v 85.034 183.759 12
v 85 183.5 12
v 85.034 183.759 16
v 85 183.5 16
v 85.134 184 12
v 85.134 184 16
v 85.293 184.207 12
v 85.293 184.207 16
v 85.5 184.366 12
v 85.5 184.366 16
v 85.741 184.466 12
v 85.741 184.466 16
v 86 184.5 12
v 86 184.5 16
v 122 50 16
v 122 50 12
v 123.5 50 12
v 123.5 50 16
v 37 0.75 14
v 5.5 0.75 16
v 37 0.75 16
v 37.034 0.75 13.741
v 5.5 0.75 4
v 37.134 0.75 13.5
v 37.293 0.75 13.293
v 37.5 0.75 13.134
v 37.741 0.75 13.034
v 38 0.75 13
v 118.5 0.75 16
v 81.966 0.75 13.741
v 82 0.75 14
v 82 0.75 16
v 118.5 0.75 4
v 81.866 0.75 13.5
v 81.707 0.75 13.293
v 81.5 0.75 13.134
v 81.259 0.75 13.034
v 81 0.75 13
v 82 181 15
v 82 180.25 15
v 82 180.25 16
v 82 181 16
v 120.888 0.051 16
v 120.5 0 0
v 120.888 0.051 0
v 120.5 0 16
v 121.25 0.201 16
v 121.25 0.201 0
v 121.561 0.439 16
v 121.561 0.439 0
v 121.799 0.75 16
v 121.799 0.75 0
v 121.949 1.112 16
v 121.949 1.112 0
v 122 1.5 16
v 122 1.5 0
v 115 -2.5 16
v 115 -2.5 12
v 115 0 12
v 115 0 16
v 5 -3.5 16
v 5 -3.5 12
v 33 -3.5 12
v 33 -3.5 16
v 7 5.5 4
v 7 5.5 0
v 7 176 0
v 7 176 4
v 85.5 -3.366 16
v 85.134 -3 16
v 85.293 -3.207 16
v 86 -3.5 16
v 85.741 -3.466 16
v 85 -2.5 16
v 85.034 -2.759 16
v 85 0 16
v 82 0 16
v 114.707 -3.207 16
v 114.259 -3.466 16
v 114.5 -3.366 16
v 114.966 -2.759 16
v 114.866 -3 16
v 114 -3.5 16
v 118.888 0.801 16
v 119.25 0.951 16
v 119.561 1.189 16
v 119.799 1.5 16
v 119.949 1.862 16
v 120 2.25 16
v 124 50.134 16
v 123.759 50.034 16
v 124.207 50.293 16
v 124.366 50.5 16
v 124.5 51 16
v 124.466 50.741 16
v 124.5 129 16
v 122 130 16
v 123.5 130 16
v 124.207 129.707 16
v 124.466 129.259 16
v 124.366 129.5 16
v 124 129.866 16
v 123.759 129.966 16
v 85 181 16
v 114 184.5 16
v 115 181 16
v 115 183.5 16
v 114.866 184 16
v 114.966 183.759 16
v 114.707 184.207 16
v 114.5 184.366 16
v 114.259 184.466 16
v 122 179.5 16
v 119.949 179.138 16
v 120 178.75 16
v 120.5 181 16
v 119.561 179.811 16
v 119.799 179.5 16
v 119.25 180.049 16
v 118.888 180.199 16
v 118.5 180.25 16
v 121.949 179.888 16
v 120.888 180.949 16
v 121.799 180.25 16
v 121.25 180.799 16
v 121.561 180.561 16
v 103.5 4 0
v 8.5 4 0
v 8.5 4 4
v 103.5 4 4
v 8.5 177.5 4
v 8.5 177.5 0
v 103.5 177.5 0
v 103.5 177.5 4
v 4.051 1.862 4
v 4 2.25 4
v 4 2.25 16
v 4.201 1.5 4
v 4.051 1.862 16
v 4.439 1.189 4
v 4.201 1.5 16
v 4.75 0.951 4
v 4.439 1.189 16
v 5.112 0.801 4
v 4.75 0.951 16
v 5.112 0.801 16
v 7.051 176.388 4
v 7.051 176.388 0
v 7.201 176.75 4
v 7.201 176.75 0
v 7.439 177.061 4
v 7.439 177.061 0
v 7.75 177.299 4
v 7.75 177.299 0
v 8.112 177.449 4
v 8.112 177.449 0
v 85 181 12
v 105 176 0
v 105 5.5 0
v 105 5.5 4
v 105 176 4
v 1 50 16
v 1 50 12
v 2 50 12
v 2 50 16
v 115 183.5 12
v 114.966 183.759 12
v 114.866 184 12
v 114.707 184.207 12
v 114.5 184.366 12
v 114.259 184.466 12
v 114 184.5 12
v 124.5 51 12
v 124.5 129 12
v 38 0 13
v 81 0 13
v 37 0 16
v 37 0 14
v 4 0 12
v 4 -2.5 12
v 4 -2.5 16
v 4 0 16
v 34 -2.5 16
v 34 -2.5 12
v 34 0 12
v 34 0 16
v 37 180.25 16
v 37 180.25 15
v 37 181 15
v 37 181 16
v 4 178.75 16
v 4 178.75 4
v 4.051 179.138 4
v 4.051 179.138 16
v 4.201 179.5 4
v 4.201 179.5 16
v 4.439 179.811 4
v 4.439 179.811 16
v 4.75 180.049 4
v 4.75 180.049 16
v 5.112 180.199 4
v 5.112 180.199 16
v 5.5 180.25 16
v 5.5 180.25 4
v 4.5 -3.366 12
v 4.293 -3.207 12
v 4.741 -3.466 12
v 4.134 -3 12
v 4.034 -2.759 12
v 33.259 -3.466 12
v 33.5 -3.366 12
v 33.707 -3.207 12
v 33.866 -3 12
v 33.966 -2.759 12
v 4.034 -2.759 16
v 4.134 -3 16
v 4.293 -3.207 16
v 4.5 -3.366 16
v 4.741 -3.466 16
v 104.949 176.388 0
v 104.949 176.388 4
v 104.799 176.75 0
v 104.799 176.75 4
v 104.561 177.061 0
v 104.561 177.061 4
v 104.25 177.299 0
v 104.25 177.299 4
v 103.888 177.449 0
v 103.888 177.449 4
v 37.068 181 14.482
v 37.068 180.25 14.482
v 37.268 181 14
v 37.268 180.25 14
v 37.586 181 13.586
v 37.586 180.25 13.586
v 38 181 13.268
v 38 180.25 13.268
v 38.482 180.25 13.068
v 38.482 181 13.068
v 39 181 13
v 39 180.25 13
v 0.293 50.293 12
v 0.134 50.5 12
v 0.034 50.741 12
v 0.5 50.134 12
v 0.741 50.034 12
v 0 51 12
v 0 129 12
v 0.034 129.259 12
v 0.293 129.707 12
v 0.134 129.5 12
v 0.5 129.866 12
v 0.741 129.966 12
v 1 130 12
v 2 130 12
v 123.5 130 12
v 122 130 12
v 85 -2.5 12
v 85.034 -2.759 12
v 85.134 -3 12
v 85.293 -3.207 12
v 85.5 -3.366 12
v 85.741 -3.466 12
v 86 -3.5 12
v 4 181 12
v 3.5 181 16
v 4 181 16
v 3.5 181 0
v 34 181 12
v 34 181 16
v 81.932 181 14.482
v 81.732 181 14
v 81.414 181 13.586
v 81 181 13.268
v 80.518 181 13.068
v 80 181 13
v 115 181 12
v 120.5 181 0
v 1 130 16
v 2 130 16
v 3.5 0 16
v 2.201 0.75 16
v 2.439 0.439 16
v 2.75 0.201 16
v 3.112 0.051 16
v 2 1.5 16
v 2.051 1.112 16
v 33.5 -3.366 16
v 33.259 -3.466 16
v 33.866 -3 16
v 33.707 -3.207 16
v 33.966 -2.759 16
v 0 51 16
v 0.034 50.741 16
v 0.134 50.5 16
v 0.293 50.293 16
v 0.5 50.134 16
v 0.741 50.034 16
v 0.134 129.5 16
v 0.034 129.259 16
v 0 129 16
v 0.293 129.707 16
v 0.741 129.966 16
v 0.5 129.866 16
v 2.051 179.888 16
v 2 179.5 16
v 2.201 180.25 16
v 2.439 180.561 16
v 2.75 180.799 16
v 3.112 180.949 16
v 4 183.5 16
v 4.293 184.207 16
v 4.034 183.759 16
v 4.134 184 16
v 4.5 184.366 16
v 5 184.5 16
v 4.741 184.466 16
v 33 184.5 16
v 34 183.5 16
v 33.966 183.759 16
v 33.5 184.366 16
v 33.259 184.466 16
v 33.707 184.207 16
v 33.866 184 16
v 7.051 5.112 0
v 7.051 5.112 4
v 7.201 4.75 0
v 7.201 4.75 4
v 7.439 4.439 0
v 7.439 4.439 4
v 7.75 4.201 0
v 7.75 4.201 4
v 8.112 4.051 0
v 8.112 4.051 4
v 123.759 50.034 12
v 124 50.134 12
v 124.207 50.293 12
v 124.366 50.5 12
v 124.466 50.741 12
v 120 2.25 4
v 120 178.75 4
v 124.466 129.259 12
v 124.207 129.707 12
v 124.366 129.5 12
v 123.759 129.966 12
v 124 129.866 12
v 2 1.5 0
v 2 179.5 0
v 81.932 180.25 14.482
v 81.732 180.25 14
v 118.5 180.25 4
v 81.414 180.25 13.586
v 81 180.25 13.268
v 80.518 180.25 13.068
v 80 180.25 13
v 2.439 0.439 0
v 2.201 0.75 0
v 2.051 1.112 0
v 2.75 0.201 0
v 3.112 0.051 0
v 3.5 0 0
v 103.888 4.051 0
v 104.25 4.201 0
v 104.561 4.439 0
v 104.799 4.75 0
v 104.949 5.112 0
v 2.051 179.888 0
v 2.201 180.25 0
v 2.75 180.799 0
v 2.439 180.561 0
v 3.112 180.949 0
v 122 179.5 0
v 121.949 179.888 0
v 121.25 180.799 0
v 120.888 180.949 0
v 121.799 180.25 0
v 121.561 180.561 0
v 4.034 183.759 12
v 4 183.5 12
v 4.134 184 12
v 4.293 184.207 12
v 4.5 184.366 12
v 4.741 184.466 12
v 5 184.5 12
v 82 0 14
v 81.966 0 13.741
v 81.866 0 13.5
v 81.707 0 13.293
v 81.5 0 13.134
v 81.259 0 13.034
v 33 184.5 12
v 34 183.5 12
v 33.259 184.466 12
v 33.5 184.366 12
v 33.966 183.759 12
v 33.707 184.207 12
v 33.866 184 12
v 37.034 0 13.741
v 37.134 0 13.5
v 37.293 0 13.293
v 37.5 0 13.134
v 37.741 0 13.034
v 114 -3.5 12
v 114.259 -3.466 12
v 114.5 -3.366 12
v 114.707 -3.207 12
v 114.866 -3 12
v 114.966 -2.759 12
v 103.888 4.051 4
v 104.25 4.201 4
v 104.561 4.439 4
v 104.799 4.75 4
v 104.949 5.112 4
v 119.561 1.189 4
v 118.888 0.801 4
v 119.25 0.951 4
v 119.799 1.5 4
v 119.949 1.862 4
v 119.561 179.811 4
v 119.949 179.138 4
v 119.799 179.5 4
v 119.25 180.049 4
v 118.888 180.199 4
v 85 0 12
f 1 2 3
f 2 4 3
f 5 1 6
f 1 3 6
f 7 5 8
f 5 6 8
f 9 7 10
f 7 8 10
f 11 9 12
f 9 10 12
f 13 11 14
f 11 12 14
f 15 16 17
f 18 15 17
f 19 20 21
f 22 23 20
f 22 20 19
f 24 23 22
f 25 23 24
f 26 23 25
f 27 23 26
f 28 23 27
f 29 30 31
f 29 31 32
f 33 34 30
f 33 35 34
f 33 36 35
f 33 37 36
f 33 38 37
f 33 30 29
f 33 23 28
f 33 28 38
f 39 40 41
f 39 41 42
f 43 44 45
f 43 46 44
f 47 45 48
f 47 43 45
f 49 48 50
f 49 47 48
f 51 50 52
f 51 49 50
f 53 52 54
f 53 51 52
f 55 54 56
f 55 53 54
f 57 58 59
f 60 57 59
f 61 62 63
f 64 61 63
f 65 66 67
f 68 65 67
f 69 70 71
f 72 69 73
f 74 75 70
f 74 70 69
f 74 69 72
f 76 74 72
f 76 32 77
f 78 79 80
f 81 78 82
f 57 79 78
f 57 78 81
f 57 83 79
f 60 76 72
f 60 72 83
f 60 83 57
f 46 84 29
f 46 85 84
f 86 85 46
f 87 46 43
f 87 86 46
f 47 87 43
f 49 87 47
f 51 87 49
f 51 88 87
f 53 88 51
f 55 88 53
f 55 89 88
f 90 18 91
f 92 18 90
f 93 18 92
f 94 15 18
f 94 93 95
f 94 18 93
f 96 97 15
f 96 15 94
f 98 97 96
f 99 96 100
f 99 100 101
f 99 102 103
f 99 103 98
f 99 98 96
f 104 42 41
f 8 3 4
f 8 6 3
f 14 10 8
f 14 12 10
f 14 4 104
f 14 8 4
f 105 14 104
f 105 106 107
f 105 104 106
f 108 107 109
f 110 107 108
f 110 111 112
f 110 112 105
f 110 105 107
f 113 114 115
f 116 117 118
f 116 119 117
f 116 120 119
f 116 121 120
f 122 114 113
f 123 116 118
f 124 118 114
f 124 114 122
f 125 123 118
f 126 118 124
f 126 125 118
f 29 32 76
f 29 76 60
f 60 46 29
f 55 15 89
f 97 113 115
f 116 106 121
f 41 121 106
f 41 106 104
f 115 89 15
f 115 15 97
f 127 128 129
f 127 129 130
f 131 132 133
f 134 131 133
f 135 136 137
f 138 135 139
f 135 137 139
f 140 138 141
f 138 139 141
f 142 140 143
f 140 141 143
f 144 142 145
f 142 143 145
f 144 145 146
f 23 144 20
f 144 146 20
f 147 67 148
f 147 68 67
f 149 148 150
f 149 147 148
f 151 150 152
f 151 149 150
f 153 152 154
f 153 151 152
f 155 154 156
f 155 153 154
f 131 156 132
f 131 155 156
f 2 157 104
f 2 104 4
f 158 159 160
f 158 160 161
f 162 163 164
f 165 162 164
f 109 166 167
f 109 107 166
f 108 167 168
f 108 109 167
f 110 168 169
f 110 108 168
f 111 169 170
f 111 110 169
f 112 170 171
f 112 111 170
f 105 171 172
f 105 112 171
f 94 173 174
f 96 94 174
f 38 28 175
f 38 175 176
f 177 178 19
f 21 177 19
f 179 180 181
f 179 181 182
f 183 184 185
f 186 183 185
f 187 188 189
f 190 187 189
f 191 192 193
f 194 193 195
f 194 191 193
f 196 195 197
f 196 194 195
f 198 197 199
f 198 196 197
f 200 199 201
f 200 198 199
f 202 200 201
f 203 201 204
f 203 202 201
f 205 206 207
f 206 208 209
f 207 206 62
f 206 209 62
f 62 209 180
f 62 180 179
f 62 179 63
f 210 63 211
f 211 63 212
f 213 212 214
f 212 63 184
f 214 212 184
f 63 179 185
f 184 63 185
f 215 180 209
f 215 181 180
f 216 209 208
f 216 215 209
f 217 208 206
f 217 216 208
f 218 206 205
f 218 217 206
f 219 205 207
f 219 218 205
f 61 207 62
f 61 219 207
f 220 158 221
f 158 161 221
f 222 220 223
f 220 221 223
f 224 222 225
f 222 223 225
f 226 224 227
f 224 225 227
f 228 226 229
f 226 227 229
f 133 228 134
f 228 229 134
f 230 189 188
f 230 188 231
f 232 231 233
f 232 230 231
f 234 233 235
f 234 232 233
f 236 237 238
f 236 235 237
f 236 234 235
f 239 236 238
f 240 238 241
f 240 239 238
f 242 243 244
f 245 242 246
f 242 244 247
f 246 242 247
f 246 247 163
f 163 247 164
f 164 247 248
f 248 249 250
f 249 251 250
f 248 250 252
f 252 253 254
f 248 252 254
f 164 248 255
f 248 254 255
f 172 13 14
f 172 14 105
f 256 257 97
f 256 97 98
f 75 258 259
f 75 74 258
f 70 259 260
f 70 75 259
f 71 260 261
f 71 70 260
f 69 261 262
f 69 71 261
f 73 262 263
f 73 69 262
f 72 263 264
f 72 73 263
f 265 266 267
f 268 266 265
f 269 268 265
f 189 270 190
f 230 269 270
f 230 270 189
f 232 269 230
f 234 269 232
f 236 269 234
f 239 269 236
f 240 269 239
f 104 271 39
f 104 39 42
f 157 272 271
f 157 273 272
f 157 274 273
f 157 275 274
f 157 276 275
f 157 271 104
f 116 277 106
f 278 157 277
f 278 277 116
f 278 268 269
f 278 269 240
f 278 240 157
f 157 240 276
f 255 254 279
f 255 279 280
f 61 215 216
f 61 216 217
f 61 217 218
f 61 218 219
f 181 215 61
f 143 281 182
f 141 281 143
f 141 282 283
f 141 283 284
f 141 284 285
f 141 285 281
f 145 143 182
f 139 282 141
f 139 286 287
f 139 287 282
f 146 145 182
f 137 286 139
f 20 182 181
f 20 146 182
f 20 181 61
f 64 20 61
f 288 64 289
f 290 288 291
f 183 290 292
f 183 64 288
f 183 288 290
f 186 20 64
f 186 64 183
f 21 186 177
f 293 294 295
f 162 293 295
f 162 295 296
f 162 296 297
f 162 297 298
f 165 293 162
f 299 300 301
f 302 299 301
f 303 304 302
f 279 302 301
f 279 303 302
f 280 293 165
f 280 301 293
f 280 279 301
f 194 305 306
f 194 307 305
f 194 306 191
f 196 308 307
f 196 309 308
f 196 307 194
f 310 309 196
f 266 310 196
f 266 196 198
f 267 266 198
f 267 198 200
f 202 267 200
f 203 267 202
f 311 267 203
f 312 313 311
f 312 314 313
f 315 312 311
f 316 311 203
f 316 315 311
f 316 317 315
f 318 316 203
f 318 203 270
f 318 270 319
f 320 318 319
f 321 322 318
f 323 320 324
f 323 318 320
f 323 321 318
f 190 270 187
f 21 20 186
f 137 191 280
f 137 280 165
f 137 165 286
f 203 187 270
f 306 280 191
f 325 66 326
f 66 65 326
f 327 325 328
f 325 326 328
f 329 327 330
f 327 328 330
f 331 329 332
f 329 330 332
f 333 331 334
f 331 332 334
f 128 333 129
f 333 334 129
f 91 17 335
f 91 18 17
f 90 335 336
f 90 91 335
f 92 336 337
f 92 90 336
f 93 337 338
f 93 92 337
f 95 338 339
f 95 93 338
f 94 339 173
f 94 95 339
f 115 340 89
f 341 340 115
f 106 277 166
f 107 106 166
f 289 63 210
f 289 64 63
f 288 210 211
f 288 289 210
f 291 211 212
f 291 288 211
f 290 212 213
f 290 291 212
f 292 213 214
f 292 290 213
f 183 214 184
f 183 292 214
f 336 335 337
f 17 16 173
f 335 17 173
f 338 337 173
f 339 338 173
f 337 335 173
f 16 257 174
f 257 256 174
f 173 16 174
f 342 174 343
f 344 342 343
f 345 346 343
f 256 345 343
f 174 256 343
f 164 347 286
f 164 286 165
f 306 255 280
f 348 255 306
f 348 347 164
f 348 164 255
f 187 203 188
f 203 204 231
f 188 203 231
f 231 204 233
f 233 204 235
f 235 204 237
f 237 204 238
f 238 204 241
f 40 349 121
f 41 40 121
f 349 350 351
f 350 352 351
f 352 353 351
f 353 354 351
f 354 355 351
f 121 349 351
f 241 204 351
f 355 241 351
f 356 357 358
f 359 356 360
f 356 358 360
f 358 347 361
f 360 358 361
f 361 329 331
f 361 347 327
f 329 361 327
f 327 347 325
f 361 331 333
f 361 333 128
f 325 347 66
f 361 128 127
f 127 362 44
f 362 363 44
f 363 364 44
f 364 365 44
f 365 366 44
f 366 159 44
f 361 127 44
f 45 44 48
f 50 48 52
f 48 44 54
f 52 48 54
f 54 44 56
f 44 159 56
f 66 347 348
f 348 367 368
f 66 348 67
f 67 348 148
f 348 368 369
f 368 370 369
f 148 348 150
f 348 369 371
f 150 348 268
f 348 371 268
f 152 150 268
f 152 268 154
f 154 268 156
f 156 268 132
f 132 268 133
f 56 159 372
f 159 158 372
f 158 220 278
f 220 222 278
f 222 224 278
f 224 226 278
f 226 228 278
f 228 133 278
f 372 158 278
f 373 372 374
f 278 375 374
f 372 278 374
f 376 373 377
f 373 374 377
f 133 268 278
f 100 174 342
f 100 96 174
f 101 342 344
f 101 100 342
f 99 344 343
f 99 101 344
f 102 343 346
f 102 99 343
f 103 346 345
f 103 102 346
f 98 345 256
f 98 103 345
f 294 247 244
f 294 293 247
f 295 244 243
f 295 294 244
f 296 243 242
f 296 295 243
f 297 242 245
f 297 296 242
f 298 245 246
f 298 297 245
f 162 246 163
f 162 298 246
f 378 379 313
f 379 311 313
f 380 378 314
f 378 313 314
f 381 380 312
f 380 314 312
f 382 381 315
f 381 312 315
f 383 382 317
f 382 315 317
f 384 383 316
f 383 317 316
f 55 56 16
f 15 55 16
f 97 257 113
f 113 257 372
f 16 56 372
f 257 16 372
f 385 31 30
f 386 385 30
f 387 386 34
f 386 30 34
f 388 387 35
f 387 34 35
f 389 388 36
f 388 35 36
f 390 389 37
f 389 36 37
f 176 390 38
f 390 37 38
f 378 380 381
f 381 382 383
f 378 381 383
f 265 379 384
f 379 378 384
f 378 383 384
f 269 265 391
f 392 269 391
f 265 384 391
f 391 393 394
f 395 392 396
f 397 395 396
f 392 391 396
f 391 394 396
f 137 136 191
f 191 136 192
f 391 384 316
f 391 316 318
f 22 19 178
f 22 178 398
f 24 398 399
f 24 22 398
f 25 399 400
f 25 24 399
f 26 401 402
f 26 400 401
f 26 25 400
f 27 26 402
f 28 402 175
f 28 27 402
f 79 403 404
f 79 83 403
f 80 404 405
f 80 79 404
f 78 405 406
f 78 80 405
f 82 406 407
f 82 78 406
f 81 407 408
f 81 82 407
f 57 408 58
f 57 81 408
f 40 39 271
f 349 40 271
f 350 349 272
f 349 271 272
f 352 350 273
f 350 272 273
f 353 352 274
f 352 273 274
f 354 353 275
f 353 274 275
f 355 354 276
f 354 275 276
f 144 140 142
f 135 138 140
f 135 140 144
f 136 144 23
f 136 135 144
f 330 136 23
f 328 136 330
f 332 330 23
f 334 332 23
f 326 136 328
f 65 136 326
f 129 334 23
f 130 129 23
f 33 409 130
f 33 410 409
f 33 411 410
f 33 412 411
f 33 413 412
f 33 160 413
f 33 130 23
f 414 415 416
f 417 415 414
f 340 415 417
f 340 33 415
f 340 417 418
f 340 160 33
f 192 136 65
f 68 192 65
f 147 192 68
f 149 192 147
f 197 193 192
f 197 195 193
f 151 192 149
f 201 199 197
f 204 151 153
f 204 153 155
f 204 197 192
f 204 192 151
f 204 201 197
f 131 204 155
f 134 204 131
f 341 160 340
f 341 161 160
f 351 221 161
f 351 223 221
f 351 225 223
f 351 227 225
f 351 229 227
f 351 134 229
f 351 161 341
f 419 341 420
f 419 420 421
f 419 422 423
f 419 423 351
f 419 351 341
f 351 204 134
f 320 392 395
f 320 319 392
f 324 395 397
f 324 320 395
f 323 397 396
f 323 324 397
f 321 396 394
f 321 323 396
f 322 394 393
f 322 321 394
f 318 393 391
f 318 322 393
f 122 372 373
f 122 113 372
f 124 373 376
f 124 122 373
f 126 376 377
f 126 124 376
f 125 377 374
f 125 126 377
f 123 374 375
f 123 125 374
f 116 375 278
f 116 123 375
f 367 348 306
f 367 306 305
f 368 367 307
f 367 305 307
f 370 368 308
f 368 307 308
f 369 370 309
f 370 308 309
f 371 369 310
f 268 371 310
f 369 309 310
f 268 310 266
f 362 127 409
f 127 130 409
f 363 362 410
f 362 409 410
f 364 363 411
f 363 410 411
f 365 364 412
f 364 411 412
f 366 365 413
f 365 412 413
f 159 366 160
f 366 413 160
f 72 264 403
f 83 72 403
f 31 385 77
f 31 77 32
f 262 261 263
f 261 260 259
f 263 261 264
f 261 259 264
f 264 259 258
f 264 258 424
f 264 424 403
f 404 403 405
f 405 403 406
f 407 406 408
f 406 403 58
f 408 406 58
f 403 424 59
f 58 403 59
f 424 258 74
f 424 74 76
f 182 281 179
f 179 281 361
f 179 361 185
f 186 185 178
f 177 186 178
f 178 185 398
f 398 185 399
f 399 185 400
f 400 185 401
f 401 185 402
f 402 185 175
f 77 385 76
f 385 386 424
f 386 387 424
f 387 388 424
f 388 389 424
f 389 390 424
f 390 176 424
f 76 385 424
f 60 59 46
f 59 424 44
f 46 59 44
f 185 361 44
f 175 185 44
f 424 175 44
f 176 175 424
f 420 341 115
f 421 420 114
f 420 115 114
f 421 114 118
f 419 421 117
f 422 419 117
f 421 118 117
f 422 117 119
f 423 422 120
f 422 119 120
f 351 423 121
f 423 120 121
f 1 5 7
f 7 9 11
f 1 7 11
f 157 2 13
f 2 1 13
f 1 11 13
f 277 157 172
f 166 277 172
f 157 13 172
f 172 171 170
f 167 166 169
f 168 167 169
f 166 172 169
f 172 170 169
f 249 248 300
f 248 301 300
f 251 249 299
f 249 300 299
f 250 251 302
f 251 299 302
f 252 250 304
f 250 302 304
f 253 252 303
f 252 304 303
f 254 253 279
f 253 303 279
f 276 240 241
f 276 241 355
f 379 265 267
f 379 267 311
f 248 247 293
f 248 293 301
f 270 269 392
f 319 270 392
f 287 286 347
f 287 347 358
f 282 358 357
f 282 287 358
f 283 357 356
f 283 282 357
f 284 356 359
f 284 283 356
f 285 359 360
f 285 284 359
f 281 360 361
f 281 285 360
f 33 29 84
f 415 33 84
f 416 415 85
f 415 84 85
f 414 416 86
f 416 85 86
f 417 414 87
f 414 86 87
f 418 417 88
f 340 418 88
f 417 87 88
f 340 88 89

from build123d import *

# Parameters (mm, degrees)
BOX011_W      = 4
BOX011_H      = 80
BOX011_DEPTH  = 4
FILLET006_R   = 1
BOX010_W      = 30
BOX010_H      = 4
BOX010_DEPTH  = 4
FILLET007_R   = 1
BOX009_W      = 30
BOX009_H      = 4
BOX009_DEPTH  = 4
FILLET008_R   = 1
BOX008_W      = 30
BOX008_H      = 4
BOX008_DEPTH  = 4
FILLET009_R   = 1
BOX013_W      = 4
BOX013_H      = 80
BOX013_DEPTH  = 4
FILLET010_R   = 1
BOX012_W      = 30
BOX012_H      = 4
BOX012_DEPTH  = 4
FILLET005_R   = 1
BOX006_W      = 45
BOX006_H      = 10
BOX006_DEPTH  = 10
BOX007_W      = 45
BOX007_H      = 10
BOX007_DEPTH  = 10
FILLET004_1_R = 2
FILLET004_2_R = 1
BOX003_W      = 116
BOX003_H      = 179.5
BOX003_DEPTH  = 20
FILLET002_R   = 1.5
BOX002_W      = 120
BOX002_H      = 181
BOX002_DEPTH  = 12
FILLET003_R   = 1.5
BOX001_W      = 98
BOX001_H      = 173.5
BOX001_DEPTH  = 4
FILLET_R      = 1.5
BOX_W         = 120
BOX_H         = 181
BOX_DEPTH     = 4
FILLET001_R   = 1.5


with BuildPart() as fillet006:
    # Box011 → Box011 (new body)
    with BuildSketch(Plane(origin=(0, 50, 5), x_dir=(1, 0, 0), z_dir=(0, 0, 1))):
        with Locations((2, 40)):
            Rectangle(BOX011_W, BOX011_H)
    extrude(amount=BOX011_DEPTH)

    # Fillet006
    fillet006_edges = [fillet006.edges().sort_by_distance(p)[0] for p in [
        (0, 50, 7),
        (0, 130, 7),
    ]]
    fillet(fillet006_edges, radius=FILLET006_R)


with BuildPart() as fillet007:
    # Box010 → Box010 (new body)
    with BuildSketch(Plane(origin=(85, -3.5, 5), x_dir=(1, 0, 0), z_dir=(0, 0, 1))):
        with Locations((15, 2)):
            Rectangle(BOX010_W, BOX010_H)
    extrude(amount=BOX010_DEPTH)

    # Fillet007
    fillet007_edges = [fillet007.edges().sort_by_distance(p)[0] for p in [
        (85, -3.5, 7),
        (115, -3.5, 7),
    ]]
    fillet(fillet007_edges, radius=FILLET007_R)


with BuildPart() as fillet008:
    # Box009 → Box009 (new body)
    with BuildSketch(Plane(origin=(4, 180.5, 5), x_dir=(1, 0, 0), z_dir=(0, 0, 1))):
        with Locations((15, 2)):
            Rectangle(BOX009_W, BOX009_H)
    extrude(amount=BOX009_DEPTH)

    # Fillet008
    fillet008_edges = [fillet008.edges().sort_by_distance(p)[0] for p in [
        (4, 184.5, 7),
        (34, 184.5, 7),
    ]]
    fillet(fillet008_edges, radius=FILLET008_R)


with BuildPart() as fillet009:
    # Box008 → Box008 (new body)
    with BuildSketch(Plane(origin=(85, 180.5, 5), x_dir=(1, 0, 0), z_dir=(0, 0, 1))):
        with Locations((15, 2)):
            Rectangle(BOX008_W, BOX008_H)
    extrude(amount=BOX008_DEPTH)

    # Fillet009
    fillet009_edges = [fillet009.edges().sort_by_distance(p)[0] for p in [
        (85, 184.5, 7),
        (115, 184.5, 7),
    ]]
    fillet(fillet009_edges, radius=FILLET009_R)


with BuildPart() as fillet010:
    # Box013 → Box013 (new body)
    with BuildSketch(Plane(origin=(120.5, 50, 5), x_dir=(1, 0, 0), z_dir=(0, 0, 1))):
        with Locations((2, 40)):
            Rectangle(BOX013_W, BOX013_H)
    extrude(amount=BOX013_DEPTH)

    # Fillet010
    fillet010_edges = [fillet010.edges().sort_by_distance(p)[0] for p in [
        (124.5, 50, 7),
        (124.5, 130, 7),
    ]]
    fillet(fillet010_edges, radius=FILLET010_R)


with BuildPart() as fusion002:
    # Box012 → Box012 (new body)
    with BuildSketch(Plane(origin=(4, -3.5, 5), x_dir=(1, 0, 0), z_dir=(0, 0, 1))):
        with Locations((15, 2)):
            Rectangle(BOX012_W, BOX012_H)
    extrude(amount=BOX012_DEPTH)

    # Fillet005
    fillet005_edges = [fusion002.edges().sort_by_distance(p)[0] for p in [
        (4, -3.5, 7),
        (34, -3.5, 7),
    ]]
    fillet(fillet005_edges, radius=FILLET005_R)

    # Fusion002: union Fillet006, Fillet007, Fillet008, Fillet009, Fillet010
    add(fillet006.part)
    add(fillet007.part)
    add(fillet008.part)
    add(fillet009.part)
    add(fillet010.part)


with BuildPart() as fusion002_1:
    # Fusion002 placement: moved
    add(fusion002.part.moved(Location((0, 0, 7))))


with BuildPart() as cube006:
    # Box006 → Box006 (new body)
    with BuildSketch(Plane(origin=(15, -5, 0), x_dir=(1, 0, 0), z_dir=(0, 0, 1))):
        with Locations((22.5, 5)):
            Rectangle(BOX006_W, BOX006_H)
    extrude(amount=BOX006_DEPTH)


with BuildPart() as fillet004:
    # Box007 → Box007 (new body)
    with BuildSketch(Plane(origin=(15, 175, 0), x_dir=(1, 0, 0), z_dir=(0, 0, 1))):
        with Locations((22.5, 5)):
            Rectangle(BOX007_W, BOX007_H)
    extrude(amount=BOX007_DEPTH)

    # Fusion: union Cube006
    add(cube006.part)


with BuildPart() as fillet004_1:
    # Fusion placement: moved
    add(fillet004.part.moved(Location((22, 0, 13))))

    # Fillet004 1
    fillet004_1_edges = [fillet004_1.edges().sort_by_distance(p)[0] for p in [
        (37, 180, 13),
        (82, 180, 13),
    ]]
    fillet(fillet004_1_edges, radius=FILLET004_1_R)

    # Fillet004 2
    fillet004_2_edges = [fillet004_1.edges().sort_by_distance(p)[0] for p in [
        (37, 0, 13),
        (82, 0, 13),
    ]]
    fillet(fillet004_2_edges, radius=FILLET004_2_R)


with BuildPart() as fillet002:
    # Box003 → Box003 (new body)
    with BuildSketch(Plane(origin=(4, 0.75, 4), x_dir=(1, 0, 0), z_dir=(0, 0, 1))):
        with Locations((58, 89.75)):
            Rectangle(BOX003_W, BOX003_H)
    extrude(amount=BOX003_DEPTH)

    # Fillet002
    fillet002_edges = [fillet002.edges().sort_by_distance(p)[0] for p in [
        (4, 0.75, 14),
        (4, 180.25, 14),
        (120, 0.75, 14),
        (120, 180.25, 14),
    ]]
    fillet(fillet002_edges, radius=FILLET002_R)


with BuildPart() as cut002:
    # Box002 → Box002 (new body)
    with BuildSketch(Plane(origin=(2, 0, 4), x_dir=(1, 0, 0), z_dir=(0, 0, 1))):
        with Locations((60, 90.5)):
            Rectangle(BOX002_W, BOX002_H)
    extrude(amount=BOX002_DEPTH)

    # Fillet003
    fillet003_edges = [cut002.edges().sort_by_distance(p)[0] for p in [
        (2, 0, 10),
        (2, 181, 10),
        (122, 0, 10),
        (122, 181, 10),
    ]]
    fillet(fillet003_edges, radius=FILLET003_R)

    # Cut001: cut Fillet002
    add(fillet002.part, mode=Mode.SUBTRACT)

    # Cut002: cut Fillet004
    add(fillet004_1.part, mode=Mode.SUBTRACT)


with BuildPart() as fillet_body:
    # Box001 → Box001 (new body)
    with BuildSketch(Plane(origin=(7, 4, 0), x_dir=(1, 0, 0), z_dir=(0, 0, 1))):
        with Locations((49, 86.75)):
            Rectangle(BOX001_W, BOX001_H)
    extrude(amount=BOX001_DEPTH)

    # Fillet
    fillet_edges = [fillet_body.edges().sort_by_distance(p)[0] for p in [
        (7, 4, 2),
        (7, 177.5, 2),
        (105, 4, 2),
        (105, 177.5, 2),
    ]]
    fillet(fillet_edges, radius=FILLET_R)


with BuildPart() as fusion003:
    # Box → Box (new body)
    with BuildSketch(Plane(origin=(2, 0, 0), x_dir=(1, 0, 0), z_dir=(0, 0, 1))):
        with Locations((60, 90.5)):
            Rectangle(BOX_W, BOX_H)
    extrude(amount=BOX_DEPTH)

    # Fillet001
    fillet001_edges = [fusion003.edges().sort_by_distance(p)[0] for p in [
        (2, 0, 2),
        (2, 181, 2),
        (122, 0, 2),
        (122, 181, 2),
    ]]
    fillet(fillet001_edges, radius=FILLET001_R)

    # Cut: cut Fillet body
    add(fillet_body.part, mode=Mode.SUBTRACT)

    # Fusion001: union Cut002
    add(cut002.part)

    # Fusion003: union Fusion002
    add(fusion002_1.part)


solid = fusion003.part
